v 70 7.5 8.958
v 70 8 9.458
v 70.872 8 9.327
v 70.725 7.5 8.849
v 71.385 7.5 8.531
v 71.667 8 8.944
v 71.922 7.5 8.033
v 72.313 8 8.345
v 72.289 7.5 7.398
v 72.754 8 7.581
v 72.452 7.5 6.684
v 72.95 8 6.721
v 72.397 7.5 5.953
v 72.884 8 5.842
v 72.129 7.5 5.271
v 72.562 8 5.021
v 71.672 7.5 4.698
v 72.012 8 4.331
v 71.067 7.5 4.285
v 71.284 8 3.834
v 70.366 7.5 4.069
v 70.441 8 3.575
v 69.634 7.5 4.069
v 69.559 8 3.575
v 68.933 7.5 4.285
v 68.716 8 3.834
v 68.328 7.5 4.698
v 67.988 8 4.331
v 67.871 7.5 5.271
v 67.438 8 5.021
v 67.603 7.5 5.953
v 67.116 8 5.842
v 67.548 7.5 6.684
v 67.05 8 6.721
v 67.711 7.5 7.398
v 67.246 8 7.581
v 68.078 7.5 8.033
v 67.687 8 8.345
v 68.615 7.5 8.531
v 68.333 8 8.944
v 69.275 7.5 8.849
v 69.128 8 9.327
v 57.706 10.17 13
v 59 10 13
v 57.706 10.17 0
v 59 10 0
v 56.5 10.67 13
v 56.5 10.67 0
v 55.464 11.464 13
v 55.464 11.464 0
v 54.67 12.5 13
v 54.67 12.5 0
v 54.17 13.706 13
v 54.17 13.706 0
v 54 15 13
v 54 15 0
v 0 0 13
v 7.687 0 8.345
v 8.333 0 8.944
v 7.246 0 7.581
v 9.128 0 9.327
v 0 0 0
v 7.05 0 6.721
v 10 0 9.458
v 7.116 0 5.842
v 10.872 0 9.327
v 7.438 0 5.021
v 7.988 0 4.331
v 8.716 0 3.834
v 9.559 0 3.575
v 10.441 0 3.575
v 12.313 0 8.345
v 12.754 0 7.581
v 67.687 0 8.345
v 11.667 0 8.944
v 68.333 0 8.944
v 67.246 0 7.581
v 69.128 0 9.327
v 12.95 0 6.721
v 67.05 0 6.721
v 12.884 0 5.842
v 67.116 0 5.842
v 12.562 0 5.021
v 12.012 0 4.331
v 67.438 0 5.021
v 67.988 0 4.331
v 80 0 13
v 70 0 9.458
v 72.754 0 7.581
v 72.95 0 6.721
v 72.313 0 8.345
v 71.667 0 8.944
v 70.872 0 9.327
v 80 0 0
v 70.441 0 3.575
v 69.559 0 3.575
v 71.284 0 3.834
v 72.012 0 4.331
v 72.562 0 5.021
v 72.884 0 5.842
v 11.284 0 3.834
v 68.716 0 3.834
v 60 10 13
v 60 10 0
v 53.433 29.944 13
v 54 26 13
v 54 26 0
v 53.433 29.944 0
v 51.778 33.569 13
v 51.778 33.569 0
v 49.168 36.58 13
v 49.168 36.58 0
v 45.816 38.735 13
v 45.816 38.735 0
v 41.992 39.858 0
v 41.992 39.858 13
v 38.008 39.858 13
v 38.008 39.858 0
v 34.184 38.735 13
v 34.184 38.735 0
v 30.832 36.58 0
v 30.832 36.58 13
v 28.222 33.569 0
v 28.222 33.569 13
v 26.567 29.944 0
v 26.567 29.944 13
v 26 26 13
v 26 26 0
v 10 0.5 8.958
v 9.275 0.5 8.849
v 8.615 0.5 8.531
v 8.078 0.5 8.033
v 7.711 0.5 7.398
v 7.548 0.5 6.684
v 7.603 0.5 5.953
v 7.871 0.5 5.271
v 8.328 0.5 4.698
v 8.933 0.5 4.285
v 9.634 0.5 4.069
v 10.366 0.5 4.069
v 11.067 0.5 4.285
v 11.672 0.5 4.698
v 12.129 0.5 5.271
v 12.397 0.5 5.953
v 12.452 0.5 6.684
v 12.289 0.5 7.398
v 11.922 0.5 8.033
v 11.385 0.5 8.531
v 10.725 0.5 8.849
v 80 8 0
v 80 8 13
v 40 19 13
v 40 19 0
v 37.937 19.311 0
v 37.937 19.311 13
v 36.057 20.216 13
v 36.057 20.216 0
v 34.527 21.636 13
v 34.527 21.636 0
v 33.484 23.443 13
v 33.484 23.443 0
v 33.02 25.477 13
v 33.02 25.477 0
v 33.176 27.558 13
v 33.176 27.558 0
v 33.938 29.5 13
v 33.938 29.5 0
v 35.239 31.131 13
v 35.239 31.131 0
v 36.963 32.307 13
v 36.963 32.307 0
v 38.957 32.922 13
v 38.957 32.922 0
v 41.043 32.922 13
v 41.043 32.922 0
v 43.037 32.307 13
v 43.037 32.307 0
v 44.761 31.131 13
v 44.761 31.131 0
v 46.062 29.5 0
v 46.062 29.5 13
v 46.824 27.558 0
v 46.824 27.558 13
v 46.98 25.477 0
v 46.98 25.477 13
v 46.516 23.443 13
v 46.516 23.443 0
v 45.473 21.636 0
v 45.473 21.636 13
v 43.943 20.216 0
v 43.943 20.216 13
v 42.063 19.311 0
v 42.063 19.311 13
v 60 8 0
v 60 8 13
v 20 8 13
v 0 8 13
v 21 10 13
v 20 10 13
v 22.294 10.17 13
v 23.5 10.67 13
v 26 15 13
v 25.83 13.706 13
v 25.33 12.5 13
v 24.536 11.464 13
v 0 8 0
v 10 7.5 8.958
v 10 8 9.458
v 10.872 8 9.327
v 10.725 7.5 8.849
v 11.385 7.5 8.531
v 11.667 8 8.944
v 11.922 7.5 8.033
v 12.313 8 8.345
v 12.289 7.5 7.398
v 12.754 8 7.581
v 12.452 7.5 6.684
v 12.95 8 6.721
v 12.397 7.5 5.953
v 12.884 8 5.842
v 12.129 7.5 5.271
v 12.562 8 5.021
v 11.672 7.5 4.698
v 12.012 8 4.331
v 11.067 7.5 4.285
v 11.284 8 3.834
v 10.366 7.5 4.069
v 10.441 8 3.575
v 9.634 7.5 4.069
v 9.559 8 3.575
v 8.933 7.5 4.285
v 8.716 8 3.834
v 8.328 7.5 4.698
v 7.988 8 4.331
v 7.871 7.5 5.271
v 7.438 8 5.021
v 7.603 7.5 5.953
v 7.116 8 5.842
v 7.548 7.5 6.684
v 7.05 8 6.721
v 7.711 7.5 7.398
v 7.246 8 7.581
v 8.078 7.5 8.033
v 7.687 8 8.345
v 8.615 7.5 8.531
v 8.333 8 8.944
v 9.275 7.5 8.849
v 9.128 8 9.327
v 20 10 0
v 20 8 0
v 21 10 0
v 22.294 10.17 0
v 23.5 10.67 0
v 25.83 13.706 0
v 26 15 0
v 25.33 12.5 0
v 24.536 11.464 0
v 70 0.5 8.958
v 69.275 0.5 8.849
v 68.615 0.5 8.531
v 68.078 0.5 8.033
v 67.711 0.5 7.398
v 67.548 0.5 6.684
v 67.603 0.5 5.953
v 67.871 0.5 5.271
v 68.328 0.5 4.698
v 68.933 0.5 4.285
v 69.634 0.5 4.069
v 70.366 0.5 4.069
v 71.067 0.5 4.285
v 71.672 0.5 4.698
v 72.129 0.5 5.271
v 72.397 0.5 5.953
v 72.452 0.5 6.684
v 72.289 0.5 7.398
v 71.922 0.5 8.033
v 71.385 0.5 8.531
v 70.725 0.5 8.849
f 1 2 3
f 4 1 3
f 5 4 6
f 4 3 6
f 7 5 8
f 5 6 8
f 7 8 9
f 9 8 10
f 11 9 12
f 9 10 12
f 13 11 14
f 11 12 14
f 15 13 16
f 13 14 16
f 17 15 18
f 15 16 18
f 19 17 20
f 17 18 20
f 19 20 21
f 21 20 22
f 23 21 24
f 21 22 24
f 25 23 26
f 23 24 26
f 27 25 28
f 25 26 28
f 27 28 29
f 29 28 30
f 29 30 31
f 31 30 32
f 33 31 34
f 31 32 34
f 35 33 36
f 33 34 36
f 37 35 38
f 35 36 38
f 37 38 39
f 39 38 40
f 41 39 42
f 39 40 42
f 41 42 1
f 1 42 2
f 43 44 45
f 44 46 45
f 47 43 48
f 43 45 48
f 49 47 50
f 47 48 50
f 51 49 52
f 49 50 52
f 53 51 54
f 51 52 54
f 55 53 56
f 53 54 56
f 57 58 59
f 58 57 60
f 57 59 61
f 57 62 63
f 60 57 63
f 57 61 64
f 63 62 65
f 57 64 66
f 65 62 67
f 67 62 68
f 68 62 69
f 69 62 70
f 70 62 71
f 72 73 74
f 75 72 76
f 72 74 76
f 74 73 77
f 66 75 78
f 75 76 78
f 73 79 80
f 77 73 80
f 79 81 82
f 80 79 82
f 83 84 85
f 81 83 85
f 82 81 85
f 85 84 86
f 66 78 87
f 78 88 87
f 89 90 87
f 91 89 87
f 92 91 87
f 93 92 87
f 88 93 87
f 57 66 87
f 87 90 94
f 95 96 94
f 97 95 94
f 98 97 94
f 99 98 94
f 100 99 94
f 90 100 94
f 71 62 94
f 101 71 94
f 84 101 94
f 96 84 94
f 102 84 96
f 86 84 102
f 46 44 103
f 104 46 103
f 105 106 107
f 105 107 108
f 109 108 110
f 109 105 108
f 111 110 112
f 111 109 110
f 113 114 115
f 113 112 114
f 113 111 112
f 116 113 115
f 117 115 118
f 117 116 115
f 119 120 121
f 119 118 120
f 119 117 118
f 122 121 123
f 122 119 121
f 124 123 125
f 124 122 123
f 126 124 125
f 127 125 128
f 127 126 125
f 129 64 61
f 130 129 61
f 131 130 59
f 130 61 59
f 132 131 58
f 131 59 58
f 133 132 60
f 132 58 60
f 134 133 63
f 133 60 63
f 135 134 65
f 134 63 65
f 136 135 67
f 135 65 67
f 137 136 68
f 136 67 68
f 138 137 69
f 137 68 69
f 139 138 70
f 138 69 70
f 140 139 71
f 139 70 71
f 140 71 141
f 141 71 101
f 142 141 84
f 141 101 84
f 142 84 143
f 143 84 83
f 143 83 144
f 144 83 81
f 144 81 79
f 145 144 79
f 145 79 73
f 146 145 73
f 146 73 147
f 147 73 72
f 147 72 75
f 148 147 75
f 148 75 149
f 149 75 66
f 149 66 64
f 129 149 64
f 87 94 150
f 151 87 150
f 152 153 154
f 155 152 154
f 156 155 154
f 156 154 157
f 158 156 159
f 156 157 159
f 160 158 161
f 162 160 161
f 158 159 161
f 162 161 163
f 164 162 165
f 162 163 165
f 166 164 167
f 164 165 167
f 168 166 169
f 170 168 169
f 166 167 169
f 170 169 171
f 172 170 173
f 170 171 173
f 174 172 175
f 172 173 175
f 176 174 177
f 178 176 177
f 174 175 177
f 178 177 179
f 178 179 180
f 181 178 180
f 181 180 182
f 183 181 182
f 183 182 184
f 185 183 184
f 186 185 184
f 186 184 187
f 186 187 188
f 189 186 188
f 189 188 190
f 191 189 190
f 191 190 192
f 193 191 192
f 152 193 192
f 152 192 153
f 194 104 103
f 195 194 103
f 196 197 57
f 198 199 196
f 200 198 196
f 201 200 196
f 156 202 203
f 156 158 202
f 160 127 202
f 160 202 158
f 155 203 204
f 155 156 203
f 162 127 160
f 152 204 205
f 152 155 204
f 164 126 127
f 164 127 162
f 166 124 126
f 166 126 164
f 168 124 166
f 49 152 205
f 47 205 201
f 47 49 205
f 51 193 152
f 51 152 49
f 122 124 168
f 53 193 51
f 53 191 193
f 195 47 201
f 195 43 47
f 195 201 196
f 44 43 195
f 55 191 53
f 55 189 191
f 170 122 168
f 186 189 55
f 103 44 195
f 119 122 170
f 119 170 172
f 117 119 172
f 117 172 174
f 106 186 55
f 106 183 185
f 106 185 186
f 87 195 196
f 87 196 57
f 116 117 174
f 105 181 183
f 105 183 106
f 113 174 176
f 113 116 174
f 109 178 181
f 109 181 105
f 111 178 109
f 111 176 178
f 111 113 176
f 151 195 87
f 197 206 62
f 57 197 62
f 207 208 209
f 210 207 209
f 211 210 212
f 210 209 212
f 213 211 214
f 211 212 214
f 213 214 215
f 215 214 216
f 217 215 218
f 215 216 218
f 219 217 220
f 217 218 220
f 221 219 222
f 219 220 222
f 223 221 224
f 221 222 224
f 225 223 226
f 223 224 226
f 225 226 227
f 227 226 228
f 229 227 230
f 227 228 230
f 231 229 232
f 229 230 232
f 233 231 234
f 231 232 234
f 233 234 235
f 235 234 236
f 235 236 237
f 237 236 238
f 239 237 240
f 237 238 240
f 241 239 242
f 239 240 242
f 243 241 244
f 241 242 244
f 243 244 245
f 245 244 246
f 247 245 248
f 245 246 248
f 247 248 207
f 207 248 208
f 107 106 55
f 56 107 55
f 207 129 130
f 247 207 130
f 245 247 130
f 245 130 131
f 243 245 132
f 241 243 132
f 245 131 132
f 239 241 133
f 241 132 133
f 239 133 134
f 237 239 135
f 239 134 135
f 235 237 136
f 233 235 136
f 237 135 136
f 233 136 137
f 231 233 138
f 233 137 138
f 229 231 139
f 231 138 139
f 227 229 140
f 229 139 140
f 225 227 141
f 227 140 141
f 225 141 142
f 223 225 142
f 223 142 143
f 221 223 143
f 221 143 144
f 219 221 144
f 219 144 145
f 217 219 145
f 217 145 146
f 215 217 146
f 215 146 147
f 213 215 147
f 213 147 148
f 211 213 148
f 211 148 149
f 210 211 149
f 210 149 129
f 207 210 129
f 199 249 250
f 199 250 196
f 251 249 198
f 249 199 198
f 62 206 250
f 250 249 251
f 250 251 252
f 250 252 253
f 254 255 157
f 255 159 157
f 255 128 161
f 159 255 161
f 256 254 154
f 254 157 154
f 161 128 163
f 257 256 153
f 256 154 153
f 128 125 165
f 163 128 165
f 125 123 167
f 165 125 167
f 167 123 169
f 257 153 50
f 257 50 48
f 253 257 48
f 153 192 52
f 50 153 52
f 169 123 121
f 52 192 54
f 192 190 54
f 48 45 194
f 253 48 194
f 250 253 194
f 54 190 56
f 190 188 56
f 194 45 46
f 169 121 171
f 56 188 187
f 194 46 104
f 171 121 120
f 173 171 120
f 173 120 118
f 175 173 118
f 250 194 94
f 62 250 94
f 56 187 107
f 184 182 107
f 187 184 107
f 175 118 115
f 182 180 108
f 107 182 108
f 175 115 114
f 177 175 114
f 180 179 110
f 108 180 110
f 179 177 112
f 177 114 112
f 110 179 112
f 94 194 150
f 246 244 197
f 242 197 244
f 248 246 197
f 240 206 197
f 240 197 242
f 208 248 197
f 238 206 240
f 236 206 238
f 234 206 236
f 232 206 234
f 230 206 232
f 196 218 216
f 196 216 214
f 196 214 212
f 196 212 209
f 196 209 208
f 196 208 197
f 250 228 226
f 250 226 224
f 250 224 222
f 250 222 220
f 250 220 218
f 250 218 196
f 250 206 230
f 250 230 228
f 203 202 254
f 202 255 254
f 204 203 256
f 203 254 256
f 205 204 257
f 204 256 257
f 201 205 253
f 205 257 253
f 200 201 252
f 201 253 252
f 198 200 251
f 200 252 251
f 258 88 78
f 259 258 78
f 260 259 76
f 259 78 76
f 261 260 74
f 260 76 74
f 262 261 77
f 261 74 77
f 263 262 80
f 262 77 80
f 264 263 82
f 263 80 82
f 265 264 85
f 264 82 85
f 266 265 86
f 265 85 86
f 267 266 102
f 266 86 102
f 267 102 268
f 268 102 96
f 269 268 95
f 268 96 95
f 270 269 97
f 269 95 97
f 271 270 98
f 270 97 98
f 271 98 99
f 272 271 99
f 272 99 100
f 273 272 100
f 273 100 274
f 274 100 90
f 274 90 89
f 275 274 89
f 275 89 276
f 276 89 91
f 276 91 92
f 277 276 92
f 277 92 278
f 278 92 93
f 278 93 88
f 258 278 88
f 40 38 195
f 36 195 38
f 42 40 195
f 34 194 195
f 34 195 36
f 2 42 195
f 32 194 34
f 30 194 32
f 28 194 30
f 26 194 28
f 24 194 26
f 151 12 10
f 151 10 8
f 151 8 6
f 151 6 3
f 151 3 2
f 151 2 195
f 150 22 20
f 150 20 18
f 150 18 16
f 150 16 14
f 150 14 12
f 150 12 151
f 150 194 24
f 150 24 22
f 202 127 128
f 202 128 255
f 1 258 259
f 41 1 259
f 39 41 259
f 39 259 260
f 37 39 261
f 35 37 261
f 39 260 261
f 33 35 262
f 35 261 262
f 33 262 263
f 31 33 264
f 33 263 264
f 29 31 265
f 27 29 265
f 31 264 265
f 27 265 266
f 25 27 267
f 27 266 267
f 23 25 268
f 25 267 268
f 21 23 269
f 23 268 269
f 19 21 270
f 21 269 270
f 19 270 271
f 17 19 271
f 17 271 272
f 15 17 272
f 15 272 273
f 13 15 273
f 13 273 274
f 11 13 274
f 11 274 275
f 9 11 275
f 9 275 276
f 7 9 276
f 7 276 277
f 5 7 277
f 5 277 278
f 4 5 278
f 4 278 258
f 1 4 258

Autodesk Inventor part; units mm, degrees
ref_plane "YZ Plane" through (0, 0, 0) normal (1, 0, 0) x (0, 1, 0)
ref_plane "XZ Plane" through (0, 0, 0) normal (0, 1, 0) x (-1, 0, 0)
ref_plane "XY Plane" through (0, 0, 0) normal (0, 0, 1) x (1, 0, 0)
sketch "Sketch1" plane through (0, 0, 0) normal (0, 0, 1) x (1, 0, 0)
  line L0 (0, 0) -> (80, 0)
  line L1 (80, 0) -> (80, 40)
  line L2 (80, 40) -> (0, 40)
  line L3 (0, 40) -> (0, 0)
  dimension "d0" = 80
  dimension "d1" = 40
extrude "Extrusion1" add sketch "Sketch1" along normal blind 13
sketch "Sketch2" plane through (0, 0, 13) normal (0, 0, 1) x (1, 0, 0)
  line L0 (80, 0) -> (0, 0) projected
  line L1 (80, 40) -> (80, 0) projected
  point P0 (40, 26)
  dimension "d4" = 26
  dimension "d5" = 40
hole "Hole1" at (40, 26, 13) direction (0, 0, -1) diameter 14 depth 13 tip angle 118
sketch "Sketch3" plane through (0, 0, 13) normal (0, 0, 1) x (1, 0, 0)
  circle A0 centre (40, 26) radius 7 projected
  line L0 (0, 0) -> (0, 40) projected
  line L1 (80, 0) -> (0, 0) projected
  line L2 (80, 40) -> (80, 0) projected
  line L3 (0, 40) -> (80, 40) projected
  arc A1 (54, 26) -> (26, 26) centre (40, 26) ccw
  line L4 (54, 26) -> (54, 10)
  line L5 (26, 26) -> (26, 10)
  line L6 (0, 10) -> (26, 10)
  line L7 (54, 10) -> (80, 10)
  dimension "d14" = 10
  dimension "d15" = 10
  dimension "d16" = 26
extrude "Extrusion2" cut sketch "Sketch3" against normal blind 13 contours L0 L3 A1 L5 L6 | L7 L4 A1 L3 L2
sketch "Sketch6" plane through (54, 10, 13) normal (0, 1, 0) x (1, 0, 0)
  line L0 (0, 13) -> (26, 13) projected
  line L1 (0, 0) -> (0, 13) projected
  line L2 (26, 0) -> (0, 0) projected
  line L3 (26, 13) -> (26, 0) projected
  line L4 (-54, 13) -> (-28, 13) projected
  line L5 (-54, 0) -> (-54, 13) projected
  line L6 (-28, 0) -> (-54, 0) projected
  line L7 (-28, 0) -> (-28, 13) projected
  line L8 (-34, 13) -> (-34, 0)
  line L9 (6, 13) -> (6, 0)
  point P0 (-54, 13)
  dimension "d36" = 40
  dimension "d37" = 6
extrude "Extrusion4" cut sketch "Sketch6" against normal blind 2 contours L0 L3 L2 L9 | L4 L8 L6 L5
sketch "Sketch7" plane through (54, 8, 13) normal (0, 1, 0) x (1, 0, 0)
  line L0 (-54, 13) -> (-34, 13) projected
  line L1 (-54, 0) -> (-54, 13) projected
  line L2 (6, 13) -> (6, 0) projected
  line L3 (26, 0) -> (6, 0) projected
  line L4 (26, 13) -> (26, 0) projected
  line L5 (6, 13) -> (26, 13) projected
  point P0 (-44, 6.5)
  point P1 (16, 6.5)
  dimension "d40" = 60
  dimension "d41" = 6.5
  dimension "d42" = 10
hole "Hole3" at (10, 8, 6.5) at (70, 8, 6.5) direction (0, -1, 0) diameter 4.917 depth 8 tip angle 118 thread size "M6x1" class "6H" standard "ANSI Metric M Profile"
chamfer "Chamfer1" distance 0.5 angle 45 4 edges at (10, 8, 4.0415) (70, 8, 4.0415) (10, 0, 4.0415) (70, 0, 4.0415)
fillet "Fillet2" radius 5 2 edges at (26, 10, 6.5) (54, 10, 6.5)
properties part number "MANCAL DA BETONEIRA(26)" material "Carbon Steel"
